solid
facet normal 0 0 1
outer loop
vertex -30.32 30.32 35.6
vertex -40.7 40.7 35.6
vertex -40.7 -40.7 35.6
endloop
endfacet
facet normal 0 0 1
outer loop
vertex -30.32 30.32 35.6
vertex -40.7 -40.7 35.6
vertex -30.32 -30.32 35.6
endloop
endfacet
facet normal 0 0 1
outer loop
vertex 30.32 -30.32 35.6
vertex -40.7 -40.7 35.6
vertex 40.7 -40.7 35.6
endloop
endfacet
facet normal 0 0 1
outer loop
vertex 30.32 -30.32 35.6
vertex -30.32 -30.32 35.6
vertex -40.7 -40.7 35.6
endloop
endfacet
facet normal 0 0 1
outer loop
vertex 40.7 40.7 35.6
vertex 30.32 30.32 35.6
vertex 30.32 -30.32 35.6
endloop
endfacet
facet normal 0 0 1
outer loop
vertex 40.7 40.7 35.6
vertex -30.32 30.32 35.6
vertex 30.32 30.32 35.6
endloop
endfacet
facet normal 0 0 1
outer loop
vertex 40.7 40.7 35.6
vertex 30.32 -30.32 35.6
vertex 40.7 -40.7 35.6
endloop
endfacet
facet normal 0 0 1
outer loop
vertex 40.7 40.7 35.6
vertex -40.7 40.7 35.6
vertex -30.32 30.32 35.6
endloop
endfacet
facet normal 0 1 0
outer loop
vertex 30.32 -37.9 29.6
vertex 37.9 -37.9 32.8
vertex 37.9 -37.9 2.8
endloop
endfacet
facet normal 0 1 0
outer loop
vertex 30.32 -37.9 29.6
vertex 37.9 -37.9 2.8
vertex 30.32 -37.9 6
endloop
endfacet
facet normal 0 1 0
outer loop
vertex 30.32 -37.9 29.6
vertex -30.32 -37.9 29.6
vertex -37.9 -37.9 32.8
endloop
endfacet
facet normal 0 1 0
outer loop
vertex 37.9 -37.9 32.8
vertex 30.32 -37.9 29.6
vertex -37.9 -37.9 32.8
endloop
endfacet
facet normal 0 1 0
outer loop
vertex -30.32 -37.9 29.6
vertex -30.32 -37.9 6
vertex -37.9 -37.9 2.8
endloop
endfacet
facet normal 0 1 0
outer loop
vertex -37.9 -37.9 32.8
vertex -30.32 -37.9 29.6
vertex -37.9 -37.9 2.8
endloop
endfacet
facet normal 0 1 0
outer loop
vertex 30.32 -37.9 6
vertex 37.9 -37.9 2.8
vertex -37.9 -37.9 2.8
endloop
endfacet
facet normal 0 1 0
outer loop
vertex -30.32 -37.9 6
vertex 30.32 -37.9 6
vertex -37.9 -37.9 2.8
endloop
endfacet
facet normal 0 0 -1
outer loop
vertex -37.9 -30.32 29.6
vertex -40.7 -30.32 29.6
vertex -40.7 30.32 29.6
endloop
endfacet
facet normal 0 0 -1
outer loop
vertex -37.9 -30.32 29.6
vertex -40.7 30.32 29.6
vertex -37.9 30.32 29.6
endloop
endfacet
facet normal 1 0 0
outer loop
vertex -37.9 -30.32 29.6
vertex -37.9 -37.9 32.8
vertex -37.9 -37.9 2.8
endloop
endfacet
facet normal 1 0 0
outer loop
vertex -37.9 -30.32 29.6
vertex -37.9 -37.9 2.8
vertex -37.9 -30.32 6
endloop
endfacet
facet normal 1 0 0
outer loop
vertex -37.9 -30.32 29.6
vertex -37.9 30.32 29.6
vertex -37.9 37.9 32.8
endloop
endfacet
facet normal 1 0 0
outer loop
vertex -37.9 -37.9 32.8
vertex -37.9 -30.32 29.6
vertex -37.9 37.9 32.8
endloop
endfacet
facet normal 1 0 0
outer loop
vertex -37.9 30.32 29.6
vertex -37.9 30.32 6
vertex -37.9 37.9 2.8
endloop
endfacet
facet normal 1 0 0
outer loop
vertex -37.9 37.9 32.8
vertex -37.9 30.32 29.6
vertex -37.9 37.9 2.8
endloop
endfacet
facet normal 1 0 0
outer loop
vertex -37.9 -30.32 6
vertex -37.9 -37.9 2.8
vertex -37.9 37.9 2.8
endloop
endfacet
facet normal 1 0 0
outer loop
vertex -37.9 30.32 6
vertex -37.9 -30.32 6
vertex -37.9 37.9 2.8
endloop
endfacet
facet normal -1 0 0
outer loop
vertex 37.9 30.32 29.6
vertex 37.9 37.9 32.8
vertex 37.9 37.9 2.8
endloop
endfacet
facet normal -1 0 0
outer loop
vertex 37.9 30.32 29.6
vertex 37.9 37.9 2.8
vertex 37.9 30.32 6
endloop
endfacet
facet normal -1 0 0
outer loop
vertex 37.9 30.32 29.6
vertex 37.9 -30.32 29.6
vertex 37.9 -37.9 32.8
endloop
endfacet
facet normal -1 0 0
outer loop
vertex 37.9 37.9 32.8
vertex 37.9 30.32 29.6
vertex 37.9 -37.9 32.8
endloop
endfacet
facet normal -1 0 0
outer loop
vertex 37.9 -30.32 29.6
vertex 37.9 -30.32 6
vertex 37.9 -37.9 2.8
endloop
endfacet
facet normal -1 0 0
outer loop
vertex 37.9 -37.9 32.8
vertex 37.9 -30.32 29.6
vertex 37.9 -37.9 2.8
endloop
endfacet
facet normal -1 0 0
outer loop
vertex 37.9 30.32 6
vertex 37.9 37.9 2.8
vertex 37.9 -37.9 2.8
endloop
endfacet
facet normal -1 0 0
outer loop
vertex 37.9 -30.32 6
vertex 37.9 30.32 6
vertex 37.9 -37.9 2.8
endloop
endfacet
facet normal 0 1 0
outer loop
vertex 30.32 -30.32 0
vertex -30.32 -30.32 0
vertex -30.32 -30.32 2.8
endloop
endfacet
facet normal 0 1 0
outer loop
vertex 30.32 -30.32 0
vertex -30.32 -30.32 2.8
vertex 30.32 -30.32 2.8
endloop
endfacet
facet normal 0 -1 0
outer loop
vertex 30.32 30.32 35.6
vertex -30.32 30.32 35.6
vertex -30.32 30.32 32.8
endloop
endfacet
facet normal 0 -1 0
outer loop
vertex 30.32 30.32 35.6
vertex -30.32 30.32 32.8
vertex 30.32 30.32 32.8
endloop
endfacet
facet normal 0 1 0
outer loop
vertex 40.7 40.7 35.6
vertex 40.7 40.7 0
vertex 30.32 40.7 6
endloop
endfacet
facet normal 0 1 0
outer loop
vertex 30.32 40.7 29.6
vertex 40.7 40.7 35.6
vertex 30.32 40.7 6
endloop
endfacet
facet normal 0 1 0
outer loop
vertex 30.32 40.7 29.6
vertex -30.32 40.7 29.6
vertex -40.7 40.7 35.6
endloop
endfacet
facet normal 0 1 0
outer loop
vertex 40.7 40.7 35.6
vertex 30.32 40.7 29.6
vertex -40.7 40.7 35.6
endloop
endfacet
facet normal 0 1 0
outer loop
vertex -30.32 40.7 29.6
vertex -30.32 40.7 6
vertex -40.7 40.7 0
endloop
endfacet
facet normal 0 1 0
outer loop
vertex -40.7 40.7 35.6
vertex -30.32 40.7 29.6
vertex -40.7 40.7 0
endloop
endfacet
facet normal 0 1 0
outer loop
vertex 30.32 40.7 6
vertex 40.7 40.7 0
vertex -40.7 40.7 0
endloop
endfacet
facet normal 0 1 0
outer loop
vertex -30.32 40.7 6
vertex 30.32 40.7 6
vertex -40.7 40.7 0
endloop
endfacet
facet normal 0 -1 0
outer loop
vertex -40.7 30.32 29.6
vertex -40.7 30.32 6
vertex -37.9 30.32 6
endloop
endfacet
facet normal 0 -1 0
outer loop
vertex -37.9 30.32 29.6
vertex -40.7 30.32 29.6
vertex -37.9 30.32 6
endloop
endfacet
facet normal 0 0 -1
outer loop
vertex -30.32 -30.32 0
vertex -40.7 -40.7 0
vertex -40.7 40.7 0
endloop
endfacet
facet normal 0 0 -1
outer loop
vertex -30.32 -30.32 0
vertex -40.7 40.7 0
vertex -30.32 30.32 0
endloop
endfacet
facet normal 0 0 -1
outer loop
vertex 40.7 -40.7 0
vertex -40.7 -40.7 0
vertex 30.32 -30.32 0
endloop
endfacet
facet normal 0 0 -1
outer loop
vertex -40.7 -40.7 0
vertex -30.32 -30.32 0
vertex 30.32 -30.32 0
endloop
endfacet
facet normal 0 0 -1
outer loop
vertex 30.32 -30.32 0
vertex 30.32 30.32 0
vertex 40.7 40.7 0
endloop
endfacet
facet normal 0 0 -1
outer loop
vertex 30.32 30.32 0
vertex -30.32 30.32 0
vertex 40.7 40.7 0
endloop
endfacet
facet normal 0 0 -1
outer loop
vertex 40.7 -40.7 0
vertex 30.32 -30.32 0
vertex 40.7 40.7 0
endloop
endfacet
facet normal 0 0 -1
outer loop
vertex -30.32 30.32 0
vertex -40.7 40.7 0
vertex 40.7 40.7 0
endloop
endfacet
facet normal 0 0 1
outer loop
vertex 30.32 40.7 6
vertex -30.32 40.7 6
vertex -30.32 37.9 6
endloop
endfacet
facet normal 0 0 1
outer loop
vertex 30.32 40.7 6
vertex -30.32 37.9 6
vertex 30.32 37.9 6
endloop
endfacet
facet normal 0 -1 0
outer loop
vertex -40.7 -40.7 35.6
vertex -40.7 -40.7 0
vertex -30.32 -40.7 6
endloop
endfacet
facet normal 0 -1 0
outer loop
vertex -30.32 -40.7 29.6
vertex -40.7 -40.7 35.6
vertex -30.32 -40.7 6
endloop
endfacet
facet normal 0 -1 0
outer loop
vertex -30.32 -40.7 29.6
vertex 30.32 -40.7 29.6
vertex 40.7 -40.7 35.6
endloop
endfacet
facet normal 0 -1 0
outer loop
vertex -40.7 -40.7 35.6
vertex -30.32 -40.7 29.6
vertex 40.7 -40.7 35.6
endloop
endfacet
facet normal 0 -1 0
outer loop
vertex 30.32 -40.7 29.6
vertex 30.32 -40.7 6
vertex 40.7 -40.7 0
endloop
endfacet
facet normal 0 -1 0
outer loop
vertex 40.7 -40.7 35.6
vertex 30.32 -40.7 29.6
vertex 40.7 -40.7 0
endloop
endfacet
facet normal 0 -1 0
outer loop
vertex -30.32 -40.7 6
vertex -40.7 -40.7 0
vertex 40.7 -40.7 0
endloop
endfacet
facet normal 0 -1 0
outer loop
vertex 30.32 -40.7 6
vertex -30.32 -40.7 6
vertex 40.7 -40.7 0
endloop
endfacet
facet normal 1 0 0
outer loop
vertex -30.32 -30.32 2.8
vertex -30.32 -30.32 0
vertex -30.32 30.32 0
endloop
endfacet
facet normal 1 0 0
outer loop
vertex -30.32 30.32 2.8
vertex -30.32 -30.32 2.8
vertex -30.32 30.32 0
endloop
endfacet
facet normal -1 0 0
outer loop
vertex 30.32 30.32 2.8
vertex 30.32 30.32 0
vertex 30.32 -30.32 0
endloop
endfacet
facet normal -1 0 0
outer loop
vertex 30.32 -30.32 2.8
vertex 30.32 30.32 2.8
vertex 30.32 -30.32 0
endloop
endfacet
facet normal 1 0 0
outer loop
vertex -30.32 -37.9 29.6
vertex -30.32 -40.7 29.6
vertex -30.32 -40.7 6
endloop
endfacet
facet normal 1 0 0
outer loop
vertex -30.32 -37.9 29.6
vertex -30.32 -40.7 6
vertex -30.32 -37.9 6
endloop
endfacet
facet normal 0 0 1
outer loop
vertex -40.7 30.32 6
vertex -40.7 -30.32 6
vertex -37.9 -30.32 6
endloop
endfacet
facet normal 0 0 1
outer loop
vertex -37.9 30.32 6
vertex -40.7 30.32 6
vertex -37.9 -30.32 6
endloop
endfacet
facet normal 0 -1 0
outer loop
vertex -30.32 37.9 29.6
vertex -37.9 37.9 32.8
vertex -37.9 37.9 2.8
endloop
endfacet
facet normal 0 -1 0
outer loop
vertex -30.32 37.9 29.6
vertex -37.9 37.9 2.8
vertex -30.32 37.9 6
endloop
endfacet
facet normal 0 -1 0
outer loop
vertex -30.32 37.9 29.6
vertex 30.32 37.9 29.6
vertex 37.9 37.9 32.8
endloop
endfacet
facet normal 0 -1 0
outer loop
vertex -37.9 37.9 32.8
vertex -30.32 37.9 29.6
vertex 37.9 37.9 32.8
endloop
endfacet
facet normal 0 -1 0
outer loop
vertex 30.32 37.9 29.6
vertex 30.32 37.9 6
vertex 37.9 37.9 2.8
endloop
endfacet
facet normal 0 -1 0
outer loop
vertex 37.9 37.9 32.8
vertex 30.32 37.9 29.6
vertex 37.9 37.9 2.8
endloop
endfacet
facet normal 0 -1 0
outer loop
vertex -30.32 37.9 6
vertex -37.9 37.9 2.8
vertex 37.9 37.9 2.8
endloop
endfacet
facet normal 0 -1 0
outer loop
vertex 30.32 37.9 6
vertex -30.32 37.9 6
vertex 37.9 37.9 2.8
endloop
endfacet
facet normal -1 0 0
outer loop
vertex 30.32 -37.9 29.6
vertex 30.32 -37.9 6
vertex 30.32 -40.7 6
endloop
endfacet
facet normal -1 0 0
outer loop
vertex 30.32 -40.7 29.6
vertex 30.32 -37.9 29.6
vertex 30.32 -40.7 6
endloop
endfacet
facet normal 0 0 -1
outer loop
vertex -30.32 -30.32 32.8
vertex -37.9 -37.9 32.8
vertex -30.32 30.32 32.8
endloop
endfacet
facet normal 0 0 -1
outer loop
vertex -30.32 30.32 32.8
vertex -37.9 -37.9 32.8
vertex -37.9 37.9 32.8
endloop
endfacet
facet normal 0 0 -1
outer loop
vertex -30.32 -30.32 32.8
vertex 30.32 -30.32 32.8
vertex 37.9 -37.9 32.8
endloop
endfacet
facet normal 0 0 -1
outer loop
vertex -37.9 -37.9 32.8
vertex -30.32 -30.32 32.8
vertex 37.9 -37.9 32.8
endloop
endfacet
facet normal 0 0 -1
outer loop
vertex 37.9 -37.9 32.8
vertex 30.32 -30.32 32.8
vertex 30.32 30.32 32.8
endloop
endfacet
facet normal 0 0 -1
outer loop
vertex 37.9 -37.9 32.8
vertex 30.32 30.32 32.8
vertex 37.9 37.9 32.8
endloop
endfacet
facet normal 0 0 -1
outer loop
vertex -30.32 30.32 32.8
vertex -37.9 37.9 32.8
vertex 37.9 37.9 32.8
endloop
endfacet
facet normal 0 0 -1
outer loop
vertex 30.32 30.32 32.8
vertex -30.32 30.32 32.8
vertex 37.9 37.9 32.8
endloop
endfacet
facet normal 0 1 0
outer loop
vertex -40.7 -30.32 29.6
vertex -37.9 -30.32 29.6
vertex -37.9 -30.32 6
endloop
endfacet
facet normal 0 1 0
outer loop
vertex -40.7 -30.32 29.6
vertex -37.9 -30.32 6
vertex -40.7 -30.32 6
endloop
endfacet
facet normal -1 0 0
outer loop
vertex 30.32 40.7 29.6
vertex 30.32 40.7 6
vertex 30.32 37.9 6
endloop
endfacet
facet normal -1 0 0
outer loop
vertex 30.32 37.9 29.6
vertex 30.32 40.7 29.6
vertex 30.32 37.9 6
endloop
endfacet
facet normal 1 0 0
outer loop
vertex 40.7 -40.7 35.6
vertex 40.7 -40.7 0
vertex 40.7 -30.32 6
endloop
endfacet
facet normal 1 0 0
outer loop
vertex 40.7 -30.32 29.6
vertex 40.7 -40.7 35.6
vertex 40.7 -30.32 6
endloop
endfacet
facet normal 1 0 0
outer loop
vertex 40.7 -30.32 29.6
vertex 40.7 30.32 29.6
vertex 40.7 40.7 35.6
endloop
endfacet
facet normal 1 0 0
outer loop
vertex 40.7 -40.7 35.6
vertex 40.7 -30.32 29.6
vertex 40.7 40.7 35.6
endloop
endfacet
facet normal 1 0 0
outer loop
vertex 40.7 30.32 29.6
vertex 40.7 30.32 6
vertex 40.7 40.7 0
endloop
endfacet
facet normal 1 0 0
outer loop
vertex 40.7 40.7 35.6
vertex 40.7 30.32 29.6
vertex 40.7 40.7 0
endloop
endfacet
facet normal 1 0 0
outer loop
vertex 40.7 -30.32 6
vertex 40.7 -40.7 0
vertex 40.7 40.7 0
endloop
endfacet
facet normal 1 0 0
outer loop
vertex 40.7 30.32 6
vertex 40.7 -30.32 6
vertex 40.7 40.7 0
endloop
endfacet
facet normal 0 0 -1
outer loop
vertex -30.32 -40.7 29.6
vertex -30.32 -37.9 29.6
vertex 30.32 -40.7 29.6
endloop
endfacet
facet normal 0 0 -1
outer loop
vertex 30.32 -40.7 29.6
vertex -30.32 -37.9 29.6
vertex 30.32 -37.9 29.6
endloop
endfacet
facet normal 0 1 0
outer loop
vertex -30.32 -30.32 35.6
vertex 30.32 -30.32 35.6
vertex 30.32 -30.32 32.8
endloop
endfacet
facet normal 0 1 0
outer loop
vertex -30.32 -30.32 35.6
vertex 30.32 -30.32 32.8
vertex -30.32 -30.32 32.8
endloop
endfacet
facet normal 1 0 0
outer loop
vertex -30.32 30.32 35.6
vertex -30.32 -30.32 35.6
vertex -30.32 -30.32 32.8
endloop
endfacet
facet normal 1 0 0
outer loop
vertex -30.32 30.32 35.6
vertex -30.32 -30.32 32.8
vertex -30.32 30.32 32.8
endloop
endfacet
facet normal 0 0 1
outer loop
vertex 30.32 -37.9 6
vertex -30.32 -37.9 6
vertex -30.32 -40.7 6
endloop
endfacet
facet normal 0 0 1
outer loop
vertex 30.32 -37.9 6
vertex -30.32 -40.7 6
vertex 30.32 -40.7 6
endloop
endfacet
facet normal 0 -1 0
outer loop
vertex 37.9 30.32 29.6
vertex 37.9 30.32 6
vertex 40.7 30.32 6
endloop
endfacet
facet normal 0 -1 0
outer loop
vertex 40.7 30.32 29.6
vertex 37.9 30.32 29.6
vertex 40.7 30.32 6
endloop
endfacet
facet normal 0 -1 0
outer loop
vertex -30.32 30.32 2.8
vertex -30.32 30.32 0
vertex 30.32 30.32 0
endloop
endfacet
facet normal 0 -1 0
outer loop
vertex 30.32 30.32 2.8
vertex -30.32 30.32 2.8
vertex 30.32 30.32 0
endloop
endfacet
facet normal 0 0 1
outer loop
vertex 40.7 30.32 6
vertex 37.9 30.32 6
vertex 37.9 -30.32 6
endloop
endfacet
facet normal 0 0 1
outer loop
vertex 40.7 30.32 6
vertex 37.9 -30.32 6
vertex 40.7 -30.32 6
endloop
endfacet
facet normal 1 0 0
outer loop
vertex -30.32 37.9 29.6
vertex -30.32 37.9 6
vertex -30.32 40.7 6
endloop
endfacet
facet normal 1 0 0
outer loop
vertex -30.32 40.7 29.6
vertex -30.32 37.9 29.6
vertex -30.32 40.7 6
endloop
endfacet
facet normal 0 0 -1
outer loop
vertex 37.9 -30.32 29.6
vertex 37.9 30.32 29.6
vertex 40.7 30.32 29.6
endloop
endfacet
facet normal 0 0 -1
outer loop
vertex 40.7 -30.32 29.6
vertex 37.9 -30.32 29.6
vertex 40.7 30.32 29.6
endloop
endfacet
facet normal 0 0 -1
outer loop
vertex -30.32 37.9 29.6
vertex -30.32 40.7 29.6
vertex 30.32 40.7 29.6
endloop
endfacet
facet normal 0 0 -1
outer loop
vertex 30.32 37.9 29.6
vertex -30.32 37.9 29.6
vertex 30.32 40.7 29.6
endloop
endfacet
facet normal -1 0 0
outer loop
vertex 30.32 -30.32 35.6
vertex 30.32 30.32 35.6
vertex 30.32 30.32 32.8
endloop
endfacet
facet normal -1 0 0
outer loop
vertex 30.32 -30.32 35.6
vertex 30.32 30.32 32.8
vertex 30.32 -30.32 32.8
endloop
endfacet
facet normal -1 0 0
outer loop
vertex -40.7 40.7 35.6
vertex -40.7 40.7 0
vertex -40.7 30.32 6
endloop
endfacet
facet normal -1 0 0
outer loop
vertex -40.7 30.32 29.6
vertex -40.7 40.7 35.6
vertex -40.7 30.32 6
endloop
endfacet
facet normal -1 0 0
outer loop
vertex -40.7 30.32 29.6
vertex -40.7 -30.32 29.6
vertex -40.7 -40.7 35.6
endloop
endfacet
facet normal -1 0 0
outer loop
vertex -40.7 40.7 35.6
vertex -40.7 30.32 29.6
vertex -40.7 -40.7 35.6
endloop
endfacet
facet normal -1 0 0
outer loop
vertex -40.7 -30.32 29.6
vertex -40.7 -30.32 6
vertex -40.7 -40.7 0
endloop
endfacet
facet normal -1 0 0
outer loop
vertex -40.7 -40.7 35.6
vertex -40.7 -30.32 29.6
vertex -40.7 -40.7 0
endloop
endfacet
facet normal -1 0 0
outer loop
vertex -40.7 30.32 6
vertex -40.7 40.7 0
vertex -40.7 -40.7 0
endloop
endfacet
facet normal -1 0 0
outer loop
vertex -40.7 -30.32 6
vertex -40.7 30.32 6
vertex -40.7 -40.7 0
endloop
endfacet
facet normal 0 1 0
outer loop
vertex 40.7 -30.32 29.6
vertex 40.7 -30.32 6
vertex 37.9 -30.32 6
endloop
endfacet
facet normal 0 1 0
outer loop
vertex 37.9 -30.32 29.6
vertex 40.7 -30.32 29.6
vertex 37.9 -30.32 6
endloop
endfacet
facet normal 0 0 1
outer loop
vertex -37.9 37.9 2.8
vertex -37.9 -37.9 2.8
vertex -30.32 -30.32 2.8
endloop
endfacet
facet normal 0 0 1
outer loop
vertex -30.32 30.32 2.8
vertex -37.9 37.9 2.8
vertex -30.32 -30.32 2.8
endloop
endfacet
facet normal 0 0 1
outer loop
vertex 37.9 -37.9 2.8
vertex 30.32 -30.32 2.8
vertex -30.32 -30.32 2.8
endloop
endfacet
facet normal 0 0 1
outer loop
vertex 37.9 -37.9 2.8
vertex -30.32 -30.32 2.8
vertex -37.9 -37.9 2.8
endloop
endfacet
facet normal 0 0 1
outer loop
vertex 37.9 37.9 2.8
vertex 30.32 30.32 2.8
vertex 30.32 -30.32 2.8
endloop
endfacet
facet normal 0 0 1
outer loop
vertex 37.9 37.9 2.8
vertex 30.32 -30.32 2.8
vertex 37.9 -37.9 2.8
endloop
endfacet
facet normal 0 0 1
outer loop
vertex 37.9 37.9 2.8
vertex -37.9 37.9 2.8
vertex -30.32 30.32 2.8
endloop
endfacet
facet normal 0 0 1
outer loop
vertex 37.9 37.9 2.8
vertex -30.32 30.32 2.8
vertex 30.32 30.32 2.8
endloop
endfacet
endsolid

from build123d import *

# Parameters (mm, degrees)
F2_W     = 60.64
F2_H     = 2.8
F2_W_2   = 2.8
F2_H_2   = 60.64
F2_W_3   = 7.58
F2_H_3   = 7.58
F3_DEPTH = 2.8
F4_DEPTH = 6
F5_DEPTH = 35.6
F7_W     = 60.64
F7_H     = 2.8
F7_W_2   = 2.8
F7_H_2   = 60.64
F7_H_3   = 7.58
F7_W_3   = 7.58
F8_DEPTH = 2.8
F9_DEPTH = 6


with BuildPart() as f3:
    # F2 (on Top) → F3 (new body)
    with BuildSketch(Plane.XY):
        with Locations((0, 39.3)):
            Rectangle(F2_W, F2_H)
        Polygon((-40.7, 30.32), (-37.9, 30.32), (-37.9, 37.9), (-30.32, 37.9), (-30.32, 40.7), (-40.7, 40.7), align=None)
        Polygon((37.9, 37.9), (37.9, 30.32), (40.7, 30.32), (40.7, 40.7), (30.32, 40.7), (30.32, 37.9), align=None)
        with Locations((39.3, 0)):
            Rectangle(F2_W_2, F2_H_2)
        Polygon((37.9, -30.32), (37.9, -37.9), (30.32, -37.9), (30.32, -40.7), (40.7, -40.7), (40.7, -30.32), align=None)
        with Locations((0, -39.3)):
            Rectangle(F2_W, F2_H)
        Polygon((-30.32, -40.7), (-30.32, -37.9), (-37.9, -37.9), (-37.9, -30.32), (-40.7, -30.32), (-40.7, -40.7), align=None)
        with Locations((-39.3, 0)):
            Rectangle(F2_W_2, F2_H_2)
        with Locations((34.11, -34.11)):
            Rectangle(F2_W_3, F2_H_3)
        with Locations((34.11, 34.11)):
            Rectangle(F2_W_3, F2_H_3)
        with Locations((-34.11, 34.11)):
            Rectangle(F2_W_3, F2_H_3)
        with Locations((-34.11, 0)):
            Rectangle(F2_W_3, F2_H_2)
        with Locations((34.11, 0)):
            Rectangle(F2_W_3, F2_H_2)
        with Locations((-34.11, -34.11)):
            Rectangle(F2_W_3, F2_H_3)
        with Locations((0, -34.11)):
            Rectangle(F2_W, F2_H_3)
        with Locations((0, 34.11)):
            Rectangle(F2_W, F2_H_3)
    extrude(amount=F3_DEPTH)

    # F2 (on Top) → F4 (join)
    with BuildSketch(Plane.XY):
        with Locations((0, 39.3)):
            Rectangle(F2_W, F2_H)
        Polygon((-40.7, 30.32), (-37.9, 30.32), (-37.9, 37.9), (-30.32, 37.9), (-30.32, 40.7), (-40.7, 40.7), align=None)
        with Locations((-39.3, 0)):
            Rectangle(F2_W_2, F2_H_2)
        Polygon((-30.32, -40.7), (-30.32, -37.9), (-37.9, -37.9), (-37.9, -30.32), (-40.7, -30.32), (-40.7, -40.7), align=None)
        with Locations((0, -39.3)):
            Rectangle(F2_W, F2_H)
        Polygon((37.9, -30.32), (37.9, -37.9), (30.32, -37.9), (30.32, -40.7), (40.7, -40.7), (40.7, -30.32), align=None)
        with Locations((39.3, 0)):
            Rectangle(F2_W_2, F2_H_2)
        Polygon((37.9, 37.9), (37.9, 30.32), (40.7, 30.32), (40.7, 40.7), (30.32, 40.7), (30.32, 37.9), align=None)
    extrude(amount=F4_DEPTH)

    # F2 (on Top) → F5 (join)
    with BuildSketch(Plane.XY):
        Polygon((-40.7, 30.32), (-37.9, 30.32), (-37.9, 37.9), (-30.32, 37.9), (-30.32, 40.7), (-40.7, 40.7), align=None)
        Polygon((37.9, 37.9), (37.9, 30.32), (40.7, 30.32), (40.7, 40.7), (30.32, 40.7), (30.32, 37.9), align=None)
        Polygon((37.9, -30.32), (37.9, -37.9), (30.32, -37.9), (30.32, -40.7), (40.7, -40.7), (40.7, -30.32), align=None)
        Polygon((-30.32, -40.7), (-30.32, -37.9), (-37.9, -37.9), (-37.9, -30.32), (-40.7, -30.32), (-40.7, -40.7), align=None)
    extrude(amount=F5_DEPTH)

    # F7 (on offset) → F8 (join)
    with BuildSketch(Plane.XY.offset(35.6)):
        Polygon((37.9, -30.32), (37.9, -37.9), (30.32, -37.9), (30.32, -40.7), (40.7, -40.7), (40.7, -30.32), align=None)
        with Locations((0, -39.3)):
            Rectangle(F7_W, F7_H)
        with Locations((39.3, 0)):
            Rectangle(F7_W_2, F7_H_2)
        Polygon((-30.32, -40.7), (-30.32, -37.9), (-37.9, -37.9), (-37.9, -30.32), (-40.7, -30.32), (-40.7, -40.7), align=None)
        Polygon((37.9, 37.9), (37.9, 30.32), (40.7, 30.32), (40.7, 40.7), (30.32, 40.7), (30.32, 37.9), align=None)
        with Locations((-39.3, 0)):
            Rectangle(F7_W_2, F7_H_2)
        with Locations((0, 39.3)):
            Rectangle(F7_W, F7_H)
        Polygon((-40.7, 30.32), (-37.9, 30.32), (-37.9, 37.9), (-30.32, 37.9), (-30.32, 40.7), (-40.7, 40.7), align=None)
        with Locations((0, 34.11)):
            Rectangle(F7_W, F7_H_3)
        with Locations((34.11, 34.11)):
            Rectangle(F7_W_3, F7_H_3)
        with Locations((34.11, 0)):
            Rectangle(F7_W_3, F7_H_2)
        with Locations((34.11, -34.11)):
            Rectangle(F7_W_3, F7_H_3)
        with Locations((0, -34.11)):
            Rectangle(F7_W, F7_H_3)
        with Locations((-34.11, -34.11)):
            Rectangle(F7_W_3, F7_H_3)
        with Locations((-34.11, 0)):
            Rectangle(F7_W_3, F7_H_2)
        with Locations((-34.11, 34.11)):
            Rectangle(F7_W_3, F7_H_3)
    extrude(amount=-F8_DEPTH)

    # F7 (on offset) → F9 (join)
    with BuildSketch(Plane.XY.offset(35.6)):
        Polygon((-30.32, -40.7), (-30.32, -37.9), (-37.9, -37.9), (-37.9, -30.32), (-40.7, -30.32), (-40.7, -40.7), align=None)
        with Locations((-39.3, 0)):
            Rectangle(F7_W_2, F7_H_2)
        with Locations((0, -39.3)):
            Rectangle(F7_W, F7_H)
        with Locations((39.3, 0)):
            Rectangle(F7_W_2, F7_H_2)
        with Locations((0, 39.3)):
            Rectangle(F7_W, F7_H)
    extrude(amount=-F9_DEPTH)


solid = f3.part
